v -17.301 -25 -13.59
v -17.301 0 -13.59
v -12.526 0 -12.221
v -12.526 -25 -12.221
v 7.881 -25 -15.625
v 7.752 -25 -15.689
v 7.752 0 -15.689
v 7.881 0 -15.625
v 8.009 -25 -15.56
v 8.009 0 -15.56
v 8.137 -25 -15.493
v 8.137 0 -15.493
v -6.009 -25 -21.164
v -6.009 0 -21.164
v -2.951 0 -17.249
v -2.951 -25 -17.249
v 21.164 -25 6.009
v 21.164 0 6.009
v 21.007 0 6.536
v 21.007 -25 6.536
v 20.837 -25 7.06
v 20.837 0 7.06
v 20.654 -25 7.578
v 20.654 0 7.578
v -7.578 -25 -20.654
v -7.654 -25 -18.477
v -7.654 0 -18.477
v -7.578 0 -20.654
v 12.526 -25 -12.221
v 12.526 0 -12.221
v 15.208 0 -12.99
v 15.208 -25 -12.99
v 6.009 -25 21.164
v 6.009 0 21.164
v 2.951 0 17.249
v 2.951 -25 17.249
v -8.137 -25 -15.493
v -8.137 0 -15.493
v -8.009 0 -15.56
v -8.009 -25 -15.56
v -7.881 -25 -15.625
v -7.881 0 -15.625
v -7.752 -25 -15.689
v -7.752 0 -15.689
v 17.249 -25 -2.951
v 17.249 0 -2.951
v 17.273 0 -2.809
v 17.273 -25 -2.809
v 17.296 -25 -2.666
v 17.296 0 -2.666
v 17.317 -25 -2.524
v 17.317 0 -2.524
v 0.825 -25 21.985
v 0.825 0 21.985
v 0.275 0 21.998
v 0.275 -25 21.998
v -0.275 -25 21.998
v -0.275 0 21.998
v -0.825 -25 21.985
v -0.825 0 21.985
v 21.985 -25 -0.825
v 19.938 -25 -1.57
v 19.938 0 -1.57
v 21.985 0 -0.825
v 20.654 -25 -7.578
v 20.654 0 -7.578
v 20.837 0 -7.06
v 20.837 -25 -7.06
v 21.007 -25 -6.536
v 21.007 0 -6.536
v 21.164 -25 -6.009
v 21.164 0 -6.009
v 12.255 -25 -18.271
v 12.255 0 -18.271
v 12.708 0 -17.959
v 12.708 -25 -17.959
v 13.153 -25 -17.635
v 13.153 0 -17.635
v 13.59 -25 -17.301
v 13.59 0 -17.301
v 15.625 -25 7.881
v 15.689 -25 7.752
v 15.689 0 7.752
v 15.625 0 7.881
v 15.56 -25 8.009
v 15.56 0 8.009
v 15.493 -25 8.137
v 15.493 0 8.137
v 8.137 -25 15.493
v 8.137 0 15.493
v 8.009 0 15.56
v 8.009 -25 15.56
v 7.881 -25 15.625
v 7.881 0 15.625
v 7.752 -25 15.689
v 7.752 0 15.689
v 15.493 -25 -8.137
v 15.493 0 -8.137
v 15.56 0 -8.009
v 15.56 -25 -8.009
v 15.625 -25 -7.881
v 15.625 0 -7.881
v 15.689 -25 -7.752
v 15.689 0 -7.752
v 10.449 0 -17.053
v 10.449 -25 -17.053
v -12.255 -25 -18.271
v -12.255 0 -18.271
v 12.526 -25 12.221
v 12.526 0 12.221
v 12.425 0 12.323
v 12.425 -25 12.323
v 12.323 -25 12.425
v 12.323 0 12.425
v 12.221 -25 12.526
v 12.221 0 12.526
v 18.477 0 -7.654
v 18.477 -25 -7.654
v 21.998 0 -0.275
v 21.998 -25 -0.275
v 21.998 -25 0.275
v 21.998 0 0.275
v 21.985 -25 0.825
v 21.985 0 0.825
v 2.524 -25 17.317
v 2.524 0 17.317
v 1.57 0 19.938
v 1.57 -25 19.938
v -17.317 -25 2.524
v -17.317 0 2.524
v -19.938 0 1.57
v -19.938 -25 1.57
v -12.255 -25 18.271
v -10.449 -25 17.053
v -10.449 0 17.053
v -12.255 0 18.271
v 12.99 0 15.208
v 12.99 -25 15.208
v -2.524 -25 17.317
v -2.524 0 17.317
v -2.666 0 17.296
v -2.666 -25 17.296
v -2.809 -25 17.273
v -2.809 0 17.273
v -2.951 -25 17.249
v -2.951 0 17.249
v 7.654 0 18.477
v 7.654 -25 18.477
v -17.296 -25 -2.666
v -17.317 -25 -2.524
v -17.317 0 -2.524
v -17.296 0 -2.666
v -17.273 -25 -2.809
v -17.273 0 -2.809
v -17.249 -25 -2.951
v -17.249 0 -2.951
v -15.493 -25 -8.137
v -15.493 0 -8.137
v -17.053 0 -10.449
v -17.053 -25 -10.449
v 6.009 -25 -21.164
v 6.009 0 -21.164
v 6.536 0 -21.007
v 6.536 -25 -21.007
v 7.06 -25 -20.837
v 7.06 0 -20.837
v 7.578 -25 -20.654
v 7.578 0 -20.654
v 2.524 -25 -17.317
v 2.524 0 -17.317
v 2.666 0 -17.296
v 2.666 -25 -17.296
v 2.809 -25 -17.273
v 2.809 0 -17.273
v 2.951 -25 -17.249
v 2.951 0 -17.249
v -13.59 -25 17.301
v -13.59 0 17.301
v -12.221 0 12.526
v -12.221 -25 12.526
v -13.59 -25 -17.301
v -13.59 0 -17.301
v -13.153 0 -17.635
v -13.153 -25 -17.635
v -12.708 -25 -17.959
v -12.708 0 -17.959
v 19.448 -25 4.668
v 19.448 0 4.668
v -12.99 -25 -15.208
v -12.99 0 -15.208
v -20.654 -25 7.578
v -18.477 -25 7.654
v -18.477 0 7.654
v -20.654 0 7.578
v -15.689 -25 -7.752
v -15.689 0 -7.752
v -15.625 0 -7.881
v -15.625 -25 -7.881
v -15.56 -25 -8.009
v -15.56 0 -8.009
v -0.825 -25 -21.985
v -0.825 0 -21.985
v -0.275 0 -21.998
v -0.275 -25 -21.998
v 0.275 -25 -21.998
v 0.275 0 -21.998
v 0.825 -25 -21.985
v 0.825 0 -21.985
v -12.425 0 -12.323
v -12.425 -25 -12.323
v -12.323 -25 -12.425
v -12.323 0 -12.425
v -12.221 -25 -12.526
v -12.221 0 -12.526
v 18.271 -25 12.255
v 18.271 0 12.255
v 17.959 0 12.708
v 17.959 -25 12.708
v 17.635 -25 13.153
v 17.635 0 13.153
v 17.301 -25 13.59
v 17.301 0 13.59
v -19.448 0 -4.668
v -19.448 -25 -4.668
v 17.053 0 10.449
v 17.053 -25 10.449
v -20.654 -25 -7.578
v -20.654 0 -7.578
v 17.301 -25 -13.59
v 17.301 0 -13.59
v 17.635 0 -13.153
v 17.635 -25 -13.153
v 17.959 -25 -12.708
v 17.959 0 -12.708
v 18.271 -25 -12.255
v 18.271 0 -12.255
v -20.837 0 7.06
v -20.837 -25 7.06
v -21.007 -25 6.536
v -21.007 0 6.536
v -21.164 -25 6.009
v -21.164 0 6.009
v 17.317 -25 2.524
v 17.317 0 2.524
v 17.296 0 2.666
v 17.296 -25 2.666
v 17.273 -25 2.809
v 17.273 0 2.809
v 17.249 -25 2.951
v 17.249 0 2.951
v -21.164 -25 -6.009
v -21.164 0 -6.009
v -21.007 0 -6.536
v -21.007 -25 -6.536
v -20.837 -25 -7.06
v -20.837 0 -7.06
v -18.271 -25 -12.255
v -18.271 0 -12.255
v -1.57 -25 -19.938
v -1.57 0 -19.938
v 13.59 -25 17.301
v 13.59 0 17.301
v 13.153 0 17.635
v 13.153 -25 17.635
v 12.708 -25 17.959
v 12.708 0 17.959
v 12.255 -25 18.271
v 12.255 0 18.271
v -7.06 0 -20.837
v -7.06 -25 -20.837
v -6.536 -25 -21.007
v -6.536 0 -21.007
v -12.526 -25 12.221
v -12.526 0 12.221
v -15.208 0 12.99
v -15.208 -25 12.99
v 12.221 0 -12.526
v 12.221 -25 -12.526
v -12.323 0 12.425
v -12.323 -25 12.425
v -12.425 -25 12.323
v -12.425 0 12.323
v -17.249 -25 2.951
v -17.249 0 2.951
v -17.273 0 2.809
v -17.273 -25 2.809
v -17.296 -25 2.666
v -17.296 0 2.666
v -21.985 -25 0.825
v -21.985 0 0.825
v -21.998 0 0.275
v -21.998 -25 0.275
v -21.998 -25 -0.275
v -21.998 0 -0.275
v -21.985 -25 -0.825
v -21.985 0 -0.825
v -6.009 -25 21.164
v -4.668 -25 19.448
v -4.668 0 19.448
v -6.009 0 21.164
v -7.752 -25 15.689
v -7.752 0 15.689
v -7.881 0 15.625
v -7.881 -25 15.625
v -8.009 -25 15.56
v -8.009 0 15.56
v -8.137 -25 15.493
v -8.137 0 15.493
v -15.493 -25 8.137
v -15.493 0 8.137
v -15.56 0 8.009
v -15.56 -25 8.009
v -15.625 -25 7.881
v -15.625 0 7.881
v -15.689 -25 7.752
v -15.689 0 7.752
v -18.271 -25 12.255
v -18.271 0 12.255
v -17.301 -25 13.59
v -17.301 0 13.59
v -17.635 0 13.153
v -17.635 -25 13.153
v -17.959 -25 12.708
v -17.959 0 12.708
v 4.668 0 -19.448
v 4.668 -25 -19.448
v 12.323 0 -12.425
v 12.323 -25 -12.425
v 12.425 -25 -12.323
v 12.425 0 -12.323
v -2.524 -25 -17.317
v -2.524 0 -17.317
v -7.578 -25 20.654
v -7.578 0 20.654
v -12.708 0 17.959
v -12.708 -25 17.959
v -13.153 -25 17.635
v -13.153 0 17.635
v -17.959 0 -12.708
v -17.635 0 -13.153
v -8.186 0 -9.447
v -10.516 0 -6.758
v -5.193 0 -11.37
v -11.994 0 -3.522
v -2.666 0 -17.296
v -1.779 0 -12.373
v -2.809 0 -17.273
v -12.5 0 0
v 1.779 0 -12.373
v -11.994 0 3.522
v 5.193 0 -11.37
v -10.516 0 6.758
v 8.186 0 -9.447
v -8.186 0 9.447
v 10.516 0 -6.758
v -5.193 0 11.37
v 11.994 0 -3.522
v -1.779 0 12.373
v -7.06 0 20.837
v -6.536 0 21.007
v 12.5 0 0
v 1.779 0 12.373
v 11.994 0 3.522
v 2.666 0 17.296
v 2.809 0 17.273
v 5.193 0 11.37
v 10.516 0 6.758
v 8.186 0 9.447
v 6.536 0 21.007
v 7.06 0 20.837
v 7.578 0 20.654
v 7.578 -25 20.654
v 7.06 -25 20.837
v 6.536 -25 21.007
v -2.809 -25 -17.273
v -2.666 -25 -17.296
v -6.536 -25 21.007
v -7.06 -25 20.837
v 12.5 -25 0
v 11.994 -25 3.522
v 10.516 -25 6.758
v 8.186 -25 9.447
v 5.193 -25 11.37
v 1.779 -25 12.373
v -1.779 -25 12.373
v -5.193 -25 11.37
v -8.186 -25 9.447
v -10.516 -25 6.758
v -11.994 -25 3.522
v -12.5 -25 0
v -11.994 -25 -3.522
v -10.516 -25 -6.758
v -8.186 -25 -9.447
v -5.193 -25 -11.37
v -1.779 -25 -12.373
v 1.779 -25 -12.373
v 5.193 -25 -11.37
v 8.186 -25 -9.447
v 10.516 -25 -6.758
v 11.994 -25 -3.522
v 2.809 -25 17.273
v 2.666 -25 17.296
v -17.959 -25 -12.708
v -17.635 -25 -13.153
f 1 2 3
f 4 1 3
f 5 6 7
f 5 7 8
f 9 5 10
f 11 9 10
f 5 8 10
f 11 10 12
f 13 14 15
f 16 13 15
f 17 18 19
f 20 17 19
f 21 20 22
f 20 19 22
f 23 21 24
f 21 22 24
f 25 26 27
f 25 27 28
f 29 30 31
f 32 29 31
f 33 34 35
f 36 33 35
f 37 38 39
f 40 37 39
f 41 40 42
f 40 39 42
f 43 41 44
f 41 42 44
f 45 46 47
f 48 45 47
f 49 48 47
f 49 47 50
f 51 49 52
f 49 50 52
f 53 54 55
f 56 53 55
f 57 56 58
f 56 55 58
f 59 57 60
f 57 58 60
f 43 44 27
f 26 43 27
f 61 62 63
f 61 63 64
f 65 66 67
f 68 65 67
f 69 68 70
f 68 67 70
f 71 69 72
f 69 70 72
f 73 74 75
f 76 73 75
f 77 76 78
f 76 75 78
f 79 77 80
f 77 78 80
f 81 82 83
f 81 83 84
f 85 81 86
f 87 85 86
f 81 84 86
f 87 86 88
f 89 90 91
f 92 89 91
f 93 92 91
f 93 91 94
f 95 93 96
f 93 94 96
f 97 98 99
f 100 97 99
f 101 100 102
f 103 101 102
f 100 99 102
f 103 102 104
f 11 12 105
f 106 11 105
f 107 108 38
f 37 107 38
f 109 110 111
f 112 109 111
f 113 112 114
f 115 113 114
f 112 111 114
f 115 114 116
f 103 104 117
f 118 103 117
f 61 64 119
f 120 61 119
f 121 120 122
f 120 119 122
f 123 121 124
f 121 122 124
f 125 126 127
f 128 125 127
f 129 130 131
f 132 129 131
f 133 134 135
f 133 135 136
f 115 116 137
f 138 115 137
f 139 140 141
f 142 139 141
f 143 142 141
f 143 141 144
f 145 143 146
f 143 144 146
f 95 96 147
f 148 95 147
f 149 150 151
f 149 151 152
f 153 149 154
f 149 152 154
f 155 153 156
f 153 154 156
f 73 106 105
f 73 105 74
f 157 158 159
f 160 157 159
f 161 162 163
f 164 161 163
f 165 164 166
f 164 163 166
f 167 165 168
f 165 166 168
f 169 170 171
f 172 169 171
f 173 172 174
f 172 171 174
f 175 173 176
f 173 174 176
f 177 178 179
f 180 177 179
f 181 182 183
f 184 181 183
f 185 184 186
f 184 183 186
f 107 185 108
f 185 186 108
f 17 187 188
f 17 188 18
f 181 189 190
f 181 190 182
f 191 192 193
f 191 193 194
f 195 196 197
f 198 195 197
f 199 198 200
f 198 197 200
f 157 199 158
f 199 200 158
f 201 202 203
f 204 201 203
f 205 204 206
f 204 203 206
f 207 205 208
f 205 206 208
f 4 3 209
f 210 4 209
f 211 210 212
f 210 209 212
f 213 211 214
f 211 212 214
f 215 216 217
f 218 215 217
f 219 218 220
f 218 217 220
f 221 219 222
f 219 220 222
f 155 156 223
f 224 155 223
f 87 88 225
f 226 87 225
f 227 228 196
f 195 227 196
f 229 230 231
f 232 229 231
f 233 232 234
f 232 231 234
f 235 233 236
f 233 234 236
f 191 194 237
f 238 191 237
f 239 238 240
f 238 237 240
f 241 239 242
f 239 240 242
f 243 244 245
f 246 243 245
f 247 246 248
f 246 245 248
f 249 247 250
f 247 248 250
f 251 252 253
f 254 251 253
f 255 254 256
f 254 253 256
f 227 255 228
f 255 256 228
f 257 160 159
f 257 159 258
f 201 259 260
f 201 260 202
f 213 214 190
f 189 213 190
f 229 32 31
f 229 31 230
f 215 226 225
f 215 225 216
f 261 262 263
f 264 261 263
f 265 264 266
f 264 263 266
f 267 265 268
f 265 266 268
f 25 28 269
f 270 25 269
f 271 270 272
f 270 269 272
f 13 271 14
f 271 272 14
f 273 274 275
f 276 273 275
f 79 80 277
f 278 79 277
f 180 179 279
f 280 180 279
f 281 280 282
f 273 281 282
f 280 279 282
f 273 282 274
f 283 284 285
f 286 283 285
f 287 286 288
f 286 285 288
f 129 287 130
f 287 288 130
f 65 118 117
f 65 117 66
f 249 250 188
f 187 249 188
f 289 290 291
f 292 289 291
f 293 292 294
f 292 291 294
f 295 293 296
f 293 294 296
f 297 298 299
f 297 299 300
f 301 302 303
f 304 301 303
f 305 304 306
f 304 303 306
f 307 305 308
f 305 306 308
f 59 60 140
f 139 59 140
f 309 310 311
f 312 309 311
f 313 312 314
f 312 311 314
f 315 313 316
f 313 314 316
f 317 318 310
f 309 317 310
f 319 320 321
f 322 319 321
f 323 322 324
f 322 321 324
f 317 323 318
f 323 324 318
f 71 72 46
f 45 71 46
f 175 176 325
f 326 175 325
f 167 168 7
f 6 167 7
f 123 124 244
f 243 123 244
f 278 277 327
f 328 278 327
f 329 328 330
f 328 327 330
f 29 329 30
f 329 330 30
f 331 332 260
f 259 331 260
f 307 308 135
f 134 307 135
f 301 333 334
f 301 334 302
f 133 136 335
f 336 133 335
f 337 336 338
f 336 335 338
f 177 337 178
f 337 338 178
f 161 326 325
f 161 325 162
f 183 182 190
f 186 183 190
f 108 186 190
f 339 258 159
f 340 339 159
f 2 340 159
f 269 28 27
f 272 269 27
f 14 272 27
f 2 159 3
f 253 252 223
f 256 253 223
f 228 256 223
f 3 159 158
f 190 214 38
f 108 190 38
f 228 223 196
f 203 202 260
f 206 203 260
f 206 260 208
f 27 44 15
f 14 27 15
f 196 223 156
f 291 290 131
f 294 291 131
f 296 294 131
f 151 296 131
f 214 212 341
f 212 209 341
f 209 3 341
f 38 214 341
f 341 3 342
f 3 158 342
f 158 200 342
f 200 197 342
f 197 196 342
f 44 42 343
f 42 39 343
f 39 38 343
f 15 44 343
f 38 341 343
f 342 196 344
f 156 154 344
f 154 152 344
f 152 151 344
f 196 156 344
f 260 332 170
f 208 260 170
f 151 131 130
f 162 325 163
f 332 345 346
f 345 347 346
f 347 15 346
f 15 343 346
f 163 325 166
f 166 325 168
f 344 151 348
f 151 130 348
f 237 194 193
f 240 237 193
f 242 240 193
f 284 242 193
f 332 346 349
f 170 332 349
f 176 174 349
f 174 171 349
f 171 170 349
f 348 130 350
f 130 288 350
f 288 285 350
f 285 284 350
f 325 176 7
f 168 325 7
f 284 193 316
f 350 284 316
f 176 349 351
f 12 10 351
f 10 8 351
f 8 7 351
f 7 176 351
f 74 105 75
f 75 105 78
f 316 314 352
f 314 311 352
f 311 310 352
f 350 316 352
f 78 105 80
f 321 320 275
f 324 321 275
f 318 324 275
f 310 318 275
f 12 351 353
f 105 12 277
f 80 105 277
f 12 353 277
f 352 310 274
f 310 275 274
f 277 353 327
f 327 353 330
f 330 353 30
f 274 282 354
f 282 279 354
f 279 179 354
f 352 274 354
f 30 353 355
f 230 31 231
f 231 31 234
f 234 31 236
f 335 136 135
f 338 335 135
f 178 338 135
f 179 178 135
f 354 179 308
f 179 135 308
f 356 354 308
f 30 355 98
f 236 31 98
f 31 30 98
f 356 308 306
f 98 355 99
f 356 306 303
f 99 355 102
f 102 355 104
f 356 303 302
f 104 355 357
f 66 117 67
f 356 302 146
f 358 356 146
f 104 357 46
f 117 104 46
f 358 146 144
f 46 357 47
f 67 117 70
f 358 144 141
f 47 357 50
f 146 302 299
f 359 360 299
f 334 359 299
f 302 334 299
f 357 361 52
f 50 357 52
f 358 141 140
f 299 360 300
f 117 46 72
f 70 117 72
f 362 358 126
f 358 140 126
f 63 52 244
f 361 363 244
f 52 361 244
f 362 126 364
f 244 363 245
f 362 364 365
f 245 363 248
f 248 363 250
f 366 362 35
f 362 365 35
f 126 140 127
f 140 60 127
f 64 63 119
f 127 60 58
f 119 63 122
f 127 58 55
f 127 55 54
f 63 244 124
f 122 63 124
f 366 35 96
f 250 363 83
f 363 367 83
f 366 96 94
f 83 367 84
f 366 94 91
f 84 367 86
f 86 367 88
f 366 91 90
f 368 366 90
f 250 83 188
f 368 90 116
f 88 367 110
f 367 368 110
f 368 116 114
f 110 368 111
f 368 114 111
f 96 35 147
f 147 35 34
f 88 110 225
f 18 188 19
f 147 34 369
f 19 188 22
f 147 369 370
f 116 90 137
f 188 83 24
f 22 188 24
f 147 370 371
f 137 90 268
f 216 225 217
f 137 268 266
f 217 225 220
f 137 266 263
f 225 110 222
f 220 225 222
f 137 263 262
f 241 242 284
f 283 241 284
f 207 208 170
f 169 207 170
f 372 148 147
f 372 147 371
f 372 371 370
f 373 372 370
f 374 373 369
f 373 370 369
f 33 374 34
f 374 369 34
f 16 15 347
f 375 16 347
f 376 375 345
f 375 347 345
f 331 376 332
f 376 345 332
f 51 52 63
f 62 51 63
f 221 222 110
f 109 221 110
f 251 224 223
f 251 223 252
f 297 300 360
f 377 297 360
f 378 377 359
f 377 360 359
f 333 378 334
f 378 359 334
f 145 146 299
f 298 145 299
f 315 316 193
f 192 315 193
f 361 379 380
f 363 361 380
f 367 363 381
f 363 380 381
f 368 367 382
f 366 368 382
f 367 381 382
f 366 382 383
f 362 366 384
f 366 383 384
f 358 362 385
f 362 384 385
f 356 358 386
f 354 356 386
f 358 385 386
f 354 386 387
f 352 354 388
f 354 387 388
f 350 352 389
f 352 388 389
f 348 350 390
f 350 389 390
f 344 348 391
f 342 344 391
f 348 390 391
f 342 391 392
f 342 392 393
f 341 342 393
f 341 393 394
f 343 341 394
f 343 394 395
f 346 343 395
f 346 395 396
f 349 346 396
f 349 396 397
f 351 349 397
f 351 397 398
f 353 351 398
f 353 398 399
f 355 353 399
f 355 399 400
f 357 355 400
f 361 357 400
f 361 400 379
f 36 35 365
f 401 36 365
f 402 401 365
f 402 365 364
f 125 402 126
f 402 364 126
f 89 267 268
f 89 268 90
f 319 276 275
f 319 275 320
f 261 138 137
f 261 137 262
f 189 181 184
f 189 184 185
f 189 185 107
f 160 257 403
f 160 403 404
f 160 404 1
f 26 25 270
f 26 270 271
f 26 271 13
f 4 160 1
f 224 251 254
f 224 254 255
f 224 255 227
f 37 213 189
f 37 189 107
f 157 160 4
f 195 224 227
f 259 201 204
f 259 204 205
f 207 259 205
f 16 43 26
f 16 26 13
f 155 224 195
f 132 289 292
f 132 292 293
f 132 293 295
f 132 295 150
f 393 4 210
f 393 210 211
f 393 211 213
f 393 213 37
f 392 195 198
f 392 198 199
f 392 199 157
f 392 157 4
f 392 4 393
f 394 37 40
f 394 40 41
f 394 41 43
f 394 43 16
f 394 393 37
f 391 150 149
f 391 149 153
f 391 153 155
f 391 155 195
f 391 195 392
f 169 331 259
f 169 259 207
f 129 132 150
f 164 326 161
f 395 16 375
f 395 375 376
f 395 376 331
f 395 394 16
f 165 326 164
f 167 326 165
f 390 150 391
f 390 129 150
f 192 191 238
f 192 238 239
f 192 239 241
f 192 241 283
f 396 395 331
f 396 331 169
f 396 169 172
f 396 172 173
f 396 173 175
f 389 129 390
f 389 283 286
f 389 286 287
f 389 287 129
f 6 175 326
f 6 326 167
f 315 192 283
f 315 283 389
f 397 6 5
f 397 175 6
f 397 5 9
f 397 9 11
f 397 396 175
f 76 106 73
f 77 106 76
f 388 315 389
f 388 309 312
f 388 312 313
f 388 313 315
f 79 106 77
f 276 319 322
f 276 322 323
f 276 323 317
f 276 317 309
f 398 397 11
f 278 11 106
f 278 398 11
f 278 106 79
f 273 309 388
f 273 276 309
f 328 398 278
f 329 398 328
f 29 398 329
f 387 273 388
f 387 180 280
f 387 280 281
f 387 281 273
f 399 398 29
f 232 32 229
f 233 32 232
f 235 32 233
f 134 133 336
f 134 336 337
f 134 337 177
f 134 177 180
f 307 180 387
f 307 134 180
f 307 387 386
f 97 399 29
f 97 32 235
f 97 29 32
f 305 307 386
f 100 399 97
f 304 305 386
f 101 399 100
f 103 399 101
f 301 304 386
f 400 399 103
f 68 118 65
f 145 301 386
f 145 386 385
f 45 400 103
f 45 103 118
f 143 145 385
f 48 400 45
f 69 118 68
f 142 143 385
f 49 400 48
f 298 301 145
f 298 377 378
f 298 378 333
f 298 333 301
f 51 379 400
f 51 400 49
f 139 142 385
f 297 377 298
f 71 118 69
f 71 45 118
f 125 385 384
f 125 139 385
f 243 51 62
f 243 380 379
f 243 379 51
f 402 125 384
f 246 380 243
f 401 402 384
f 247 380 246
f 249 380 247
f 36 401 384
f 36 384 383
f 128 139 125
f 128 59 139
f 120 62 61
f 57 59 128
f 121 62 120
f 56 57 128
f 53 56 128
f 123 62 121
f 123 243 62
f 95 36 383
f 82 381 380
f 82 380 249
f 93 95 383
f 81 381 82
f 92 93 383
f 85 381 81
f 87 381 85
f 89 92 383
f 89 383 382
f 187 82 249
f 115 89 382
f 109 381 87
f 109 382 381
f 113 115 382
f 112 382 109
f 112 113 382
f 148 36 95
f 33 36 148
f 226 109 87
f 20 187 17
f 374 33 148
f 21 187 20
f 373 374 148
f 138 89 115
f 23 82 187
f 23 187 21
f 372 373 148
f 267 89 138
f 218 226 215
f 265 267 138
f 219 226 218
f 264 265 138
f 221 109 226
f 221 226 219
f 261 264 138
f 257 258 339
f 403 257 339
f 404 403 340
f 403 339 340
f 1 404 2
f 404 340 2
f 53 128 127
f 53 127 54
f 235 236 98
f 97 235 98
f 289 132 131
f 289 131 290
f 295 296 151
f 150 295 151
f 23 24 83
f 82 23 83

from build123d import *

# Parameters (mm, degrees)
F1_DEPTH = 25
F3_COUNT = 20
F3_ANGLE = 342
F5_R     = 12.5
F6_DEPTH = 53.5


with BuildPart() as f1:
    # F0 (on Front) → F1 (new body)
    with BuildSketch(Plane.XZ):
        with BuildLine():
            ThreePointArc((-2.524062, 17.317018), (-11.447247, -13.236712), (17.5, 0))
            ThreePointArc((17.5, 0), (13.236712, 11.447247), (2.524062, 17.317018))
            ThreePointArc((2.524062, 17.317018), (0, 17.5), (-2.524062, 17.317018))
        make_face()
        with BuildLine():
            ThreePointArc((-2.524062, 17.317018), (0, 17.5), (2.524062, 17.317018))
            Line((2.524062, 17.317018), (1.57, 19.938282))
            Line((1.57, 19.938282), (0.825231, 21.984517))
            ThreePointArc((0.825231, 21.984517), (0, 22), (-0.825231, 21.984517))
            Line((-0.825231, 21.984517), (-2.524062, 17.317018))
        make_face()
    extrude(amount=F1_DEPTH)


with BuildPart() as f3_1:
    # F3: instance of F1
    add(f1.part.rotate(Axis((0, -51.437987, 0), (0, 1, 0)), 1 * F3_ANGLE / (F3_COUNT - 1)))


with BuildPart() as f3_2:
    # F3: instance of F1
    add(f1.part.rotate(Axis((0, -51.437987, 0), (0, 1, 0)), 2 * F3_ANGLE / (F3_COUNT - 1)))


with BuildPart() as f3_3:
    # F3: instance of F1
    add(f1.part.rotate(Axis((0, -51.437987, 0), (0, 1, 0)), 3 * F3_ANGLE / (F3_COUNT - 1)))


with BuildPart() as f3_4:
    # F3: instance of F1
    add(f1.part.rotate(Axis((0, -51.437987, 0), (0, 1, 0)), 4 * F3_ANGLE / (F3_COUNT - 1)))


with BuildPart() as f3_5:
    # F3: instance of F1
    add(f1.part.rotate(Axis((0, -51.437987, 0), (0, 1, 0)), 5 * F3_ANGLE / (F3_COUNT - 1)))


with BuildPart() as f3_6:
    # F3: instance of F1
    add(f1.part.rotate(Axis((0, -51.437987, 0), (0, 1, 0)), 6 * F3_ANGLE / (F3_COUNT - 1)))


with BuildPart() as f3_7:
    # F3: instance of F1
    add(f1.part.rotate(Axis((0, -51.437987, 0), (0, 1, 0)), 7 * F3_ANGLE / (F3_COUNT - 1)))


with BuildPart() as f3_8:
    # F3: instance of F1
    add(f1.part.rotate(Axis((0, -51.437987, 0), (0, 1, 0)), 8 * F3_ANGLE / (F3_COUNT - 1)))


with BuildPart() as f3_9:
    # F3: instance of F1
    add(f1.part.rotate(Axis((0, -51.437987, 0), (0, 1, 0)), 9 * F3_ANGLE / (F3_COUNT - 1)))


with BuildPart() as f3_10:
    # F3: instance of F1
    add(f1.part.rotate(Axis((0, -51.437987, 0), (0, 1, 0)), 10 * F3_ANGLE / (F3_COUNT - 1)))


with BuildPart() as f3_11:
    # F3: instance of F1
    add(f1.part.rotate(Axis((0, -51.437987, 0), (0, 1, 0)), 11 * F3_ANGLE / (F3_COUNT - 1)))


with BuildPart() as f3_12:
    # F3: instance of F1
    add(f1.part.rotate(Axis((0, -51.437987, 0), (0, 1, 0)), 12 * F3_ANGLE / (F3_COUNT - 1)))


with BuildPart() as f3_13:
    # F3: instance of F1
    add(f1.part.rotate(Axis((0, -51.437987, 0), (0, 1, 0)), 13 * F3_ANGLE / (F3_COUNT - 1)))


with BuildPart() as f3_14:
    # F3: instance of F1
    add(f1.part.rotate(Axis((0, -51.437987, 0), (0, 1, 0)), 14 * F3_ANGLE / (F3_COUNT - 1)))


with BuildPart() as f3_15:
    # F3: instance of F1
    add(f1.part.rotate(Axis((0, -51.437987, 0), (0, 1, 0)), 15 * F3_ANGLE / (F3_COUNT - 1)))


with BuildPart() as f3_16:
    # F3: instance of F1
    add(f1.part.rotate(Axis((0, -51.437987, 0), (0, 1, 0)), 16 * F3_ANGLE / (F3_COUNT - 1)))


with BuildPart() as f3_17:
    # F3: instance of F1
    add(f1.part.rotate(Axis((0, -51.437987, 0), (0, 1, 0)), 17 * F3_ANGLE / (F3_COUNT - 1)))


with BuildPart() as f3_18:
    # F3: instance of F1
    add(f1.part.rotate(Axis((0, -51.437987, 0), (0, 1, 0)), 18 * F3_ANGLE / (F3_COUNT - 1)))


with BuildPart() as f3_19:
    # F3: instance of F1
    add(f1.part.rotate(Axis((0, -51.437987, 0), (0, 1, 0)), 19 * F3_ANGLE / (F3_COUNT - 1)))


with BuildPart() as f1_1:
    add(f1.part)

    # F4: union F3_19, F3_3, F3_11, F3_14, F3_5, F3_4, F3_8, F3_6, F3_7, F3_9, F3_10, F3_12, F3_15, F3_18, F3_13, F3_2, F3_16, F3_17, F3_1
    add(f3_19.part)
    add(f3_3.part)
    add(f3_11.part)
    add(f3_14.part)
    add(f3_5.part)
    add(f3_4.part)
    add(f3_8.part)
    add(f3_6.part)
    add(f3_7.part)
    add(f3_9.part)
    add(f3_10.part)
    add(f3_12.part)
    add(f3_15.part)
    add(f3_18.part)
    add(f3_13.part)
    add(f3_2.part)
    add(f3_16.part)
    add(f3_17.part)
    add(f3_1.part)

    # F5 (on face) → F6 (cut)
    with BuildSketch(Plane.XZ.offset(25)):
        Circle(F5_R)
    extrude(amount=-F6_DEPTH, mode=Mode.SUBTRACT)


solid = f1_1.part
